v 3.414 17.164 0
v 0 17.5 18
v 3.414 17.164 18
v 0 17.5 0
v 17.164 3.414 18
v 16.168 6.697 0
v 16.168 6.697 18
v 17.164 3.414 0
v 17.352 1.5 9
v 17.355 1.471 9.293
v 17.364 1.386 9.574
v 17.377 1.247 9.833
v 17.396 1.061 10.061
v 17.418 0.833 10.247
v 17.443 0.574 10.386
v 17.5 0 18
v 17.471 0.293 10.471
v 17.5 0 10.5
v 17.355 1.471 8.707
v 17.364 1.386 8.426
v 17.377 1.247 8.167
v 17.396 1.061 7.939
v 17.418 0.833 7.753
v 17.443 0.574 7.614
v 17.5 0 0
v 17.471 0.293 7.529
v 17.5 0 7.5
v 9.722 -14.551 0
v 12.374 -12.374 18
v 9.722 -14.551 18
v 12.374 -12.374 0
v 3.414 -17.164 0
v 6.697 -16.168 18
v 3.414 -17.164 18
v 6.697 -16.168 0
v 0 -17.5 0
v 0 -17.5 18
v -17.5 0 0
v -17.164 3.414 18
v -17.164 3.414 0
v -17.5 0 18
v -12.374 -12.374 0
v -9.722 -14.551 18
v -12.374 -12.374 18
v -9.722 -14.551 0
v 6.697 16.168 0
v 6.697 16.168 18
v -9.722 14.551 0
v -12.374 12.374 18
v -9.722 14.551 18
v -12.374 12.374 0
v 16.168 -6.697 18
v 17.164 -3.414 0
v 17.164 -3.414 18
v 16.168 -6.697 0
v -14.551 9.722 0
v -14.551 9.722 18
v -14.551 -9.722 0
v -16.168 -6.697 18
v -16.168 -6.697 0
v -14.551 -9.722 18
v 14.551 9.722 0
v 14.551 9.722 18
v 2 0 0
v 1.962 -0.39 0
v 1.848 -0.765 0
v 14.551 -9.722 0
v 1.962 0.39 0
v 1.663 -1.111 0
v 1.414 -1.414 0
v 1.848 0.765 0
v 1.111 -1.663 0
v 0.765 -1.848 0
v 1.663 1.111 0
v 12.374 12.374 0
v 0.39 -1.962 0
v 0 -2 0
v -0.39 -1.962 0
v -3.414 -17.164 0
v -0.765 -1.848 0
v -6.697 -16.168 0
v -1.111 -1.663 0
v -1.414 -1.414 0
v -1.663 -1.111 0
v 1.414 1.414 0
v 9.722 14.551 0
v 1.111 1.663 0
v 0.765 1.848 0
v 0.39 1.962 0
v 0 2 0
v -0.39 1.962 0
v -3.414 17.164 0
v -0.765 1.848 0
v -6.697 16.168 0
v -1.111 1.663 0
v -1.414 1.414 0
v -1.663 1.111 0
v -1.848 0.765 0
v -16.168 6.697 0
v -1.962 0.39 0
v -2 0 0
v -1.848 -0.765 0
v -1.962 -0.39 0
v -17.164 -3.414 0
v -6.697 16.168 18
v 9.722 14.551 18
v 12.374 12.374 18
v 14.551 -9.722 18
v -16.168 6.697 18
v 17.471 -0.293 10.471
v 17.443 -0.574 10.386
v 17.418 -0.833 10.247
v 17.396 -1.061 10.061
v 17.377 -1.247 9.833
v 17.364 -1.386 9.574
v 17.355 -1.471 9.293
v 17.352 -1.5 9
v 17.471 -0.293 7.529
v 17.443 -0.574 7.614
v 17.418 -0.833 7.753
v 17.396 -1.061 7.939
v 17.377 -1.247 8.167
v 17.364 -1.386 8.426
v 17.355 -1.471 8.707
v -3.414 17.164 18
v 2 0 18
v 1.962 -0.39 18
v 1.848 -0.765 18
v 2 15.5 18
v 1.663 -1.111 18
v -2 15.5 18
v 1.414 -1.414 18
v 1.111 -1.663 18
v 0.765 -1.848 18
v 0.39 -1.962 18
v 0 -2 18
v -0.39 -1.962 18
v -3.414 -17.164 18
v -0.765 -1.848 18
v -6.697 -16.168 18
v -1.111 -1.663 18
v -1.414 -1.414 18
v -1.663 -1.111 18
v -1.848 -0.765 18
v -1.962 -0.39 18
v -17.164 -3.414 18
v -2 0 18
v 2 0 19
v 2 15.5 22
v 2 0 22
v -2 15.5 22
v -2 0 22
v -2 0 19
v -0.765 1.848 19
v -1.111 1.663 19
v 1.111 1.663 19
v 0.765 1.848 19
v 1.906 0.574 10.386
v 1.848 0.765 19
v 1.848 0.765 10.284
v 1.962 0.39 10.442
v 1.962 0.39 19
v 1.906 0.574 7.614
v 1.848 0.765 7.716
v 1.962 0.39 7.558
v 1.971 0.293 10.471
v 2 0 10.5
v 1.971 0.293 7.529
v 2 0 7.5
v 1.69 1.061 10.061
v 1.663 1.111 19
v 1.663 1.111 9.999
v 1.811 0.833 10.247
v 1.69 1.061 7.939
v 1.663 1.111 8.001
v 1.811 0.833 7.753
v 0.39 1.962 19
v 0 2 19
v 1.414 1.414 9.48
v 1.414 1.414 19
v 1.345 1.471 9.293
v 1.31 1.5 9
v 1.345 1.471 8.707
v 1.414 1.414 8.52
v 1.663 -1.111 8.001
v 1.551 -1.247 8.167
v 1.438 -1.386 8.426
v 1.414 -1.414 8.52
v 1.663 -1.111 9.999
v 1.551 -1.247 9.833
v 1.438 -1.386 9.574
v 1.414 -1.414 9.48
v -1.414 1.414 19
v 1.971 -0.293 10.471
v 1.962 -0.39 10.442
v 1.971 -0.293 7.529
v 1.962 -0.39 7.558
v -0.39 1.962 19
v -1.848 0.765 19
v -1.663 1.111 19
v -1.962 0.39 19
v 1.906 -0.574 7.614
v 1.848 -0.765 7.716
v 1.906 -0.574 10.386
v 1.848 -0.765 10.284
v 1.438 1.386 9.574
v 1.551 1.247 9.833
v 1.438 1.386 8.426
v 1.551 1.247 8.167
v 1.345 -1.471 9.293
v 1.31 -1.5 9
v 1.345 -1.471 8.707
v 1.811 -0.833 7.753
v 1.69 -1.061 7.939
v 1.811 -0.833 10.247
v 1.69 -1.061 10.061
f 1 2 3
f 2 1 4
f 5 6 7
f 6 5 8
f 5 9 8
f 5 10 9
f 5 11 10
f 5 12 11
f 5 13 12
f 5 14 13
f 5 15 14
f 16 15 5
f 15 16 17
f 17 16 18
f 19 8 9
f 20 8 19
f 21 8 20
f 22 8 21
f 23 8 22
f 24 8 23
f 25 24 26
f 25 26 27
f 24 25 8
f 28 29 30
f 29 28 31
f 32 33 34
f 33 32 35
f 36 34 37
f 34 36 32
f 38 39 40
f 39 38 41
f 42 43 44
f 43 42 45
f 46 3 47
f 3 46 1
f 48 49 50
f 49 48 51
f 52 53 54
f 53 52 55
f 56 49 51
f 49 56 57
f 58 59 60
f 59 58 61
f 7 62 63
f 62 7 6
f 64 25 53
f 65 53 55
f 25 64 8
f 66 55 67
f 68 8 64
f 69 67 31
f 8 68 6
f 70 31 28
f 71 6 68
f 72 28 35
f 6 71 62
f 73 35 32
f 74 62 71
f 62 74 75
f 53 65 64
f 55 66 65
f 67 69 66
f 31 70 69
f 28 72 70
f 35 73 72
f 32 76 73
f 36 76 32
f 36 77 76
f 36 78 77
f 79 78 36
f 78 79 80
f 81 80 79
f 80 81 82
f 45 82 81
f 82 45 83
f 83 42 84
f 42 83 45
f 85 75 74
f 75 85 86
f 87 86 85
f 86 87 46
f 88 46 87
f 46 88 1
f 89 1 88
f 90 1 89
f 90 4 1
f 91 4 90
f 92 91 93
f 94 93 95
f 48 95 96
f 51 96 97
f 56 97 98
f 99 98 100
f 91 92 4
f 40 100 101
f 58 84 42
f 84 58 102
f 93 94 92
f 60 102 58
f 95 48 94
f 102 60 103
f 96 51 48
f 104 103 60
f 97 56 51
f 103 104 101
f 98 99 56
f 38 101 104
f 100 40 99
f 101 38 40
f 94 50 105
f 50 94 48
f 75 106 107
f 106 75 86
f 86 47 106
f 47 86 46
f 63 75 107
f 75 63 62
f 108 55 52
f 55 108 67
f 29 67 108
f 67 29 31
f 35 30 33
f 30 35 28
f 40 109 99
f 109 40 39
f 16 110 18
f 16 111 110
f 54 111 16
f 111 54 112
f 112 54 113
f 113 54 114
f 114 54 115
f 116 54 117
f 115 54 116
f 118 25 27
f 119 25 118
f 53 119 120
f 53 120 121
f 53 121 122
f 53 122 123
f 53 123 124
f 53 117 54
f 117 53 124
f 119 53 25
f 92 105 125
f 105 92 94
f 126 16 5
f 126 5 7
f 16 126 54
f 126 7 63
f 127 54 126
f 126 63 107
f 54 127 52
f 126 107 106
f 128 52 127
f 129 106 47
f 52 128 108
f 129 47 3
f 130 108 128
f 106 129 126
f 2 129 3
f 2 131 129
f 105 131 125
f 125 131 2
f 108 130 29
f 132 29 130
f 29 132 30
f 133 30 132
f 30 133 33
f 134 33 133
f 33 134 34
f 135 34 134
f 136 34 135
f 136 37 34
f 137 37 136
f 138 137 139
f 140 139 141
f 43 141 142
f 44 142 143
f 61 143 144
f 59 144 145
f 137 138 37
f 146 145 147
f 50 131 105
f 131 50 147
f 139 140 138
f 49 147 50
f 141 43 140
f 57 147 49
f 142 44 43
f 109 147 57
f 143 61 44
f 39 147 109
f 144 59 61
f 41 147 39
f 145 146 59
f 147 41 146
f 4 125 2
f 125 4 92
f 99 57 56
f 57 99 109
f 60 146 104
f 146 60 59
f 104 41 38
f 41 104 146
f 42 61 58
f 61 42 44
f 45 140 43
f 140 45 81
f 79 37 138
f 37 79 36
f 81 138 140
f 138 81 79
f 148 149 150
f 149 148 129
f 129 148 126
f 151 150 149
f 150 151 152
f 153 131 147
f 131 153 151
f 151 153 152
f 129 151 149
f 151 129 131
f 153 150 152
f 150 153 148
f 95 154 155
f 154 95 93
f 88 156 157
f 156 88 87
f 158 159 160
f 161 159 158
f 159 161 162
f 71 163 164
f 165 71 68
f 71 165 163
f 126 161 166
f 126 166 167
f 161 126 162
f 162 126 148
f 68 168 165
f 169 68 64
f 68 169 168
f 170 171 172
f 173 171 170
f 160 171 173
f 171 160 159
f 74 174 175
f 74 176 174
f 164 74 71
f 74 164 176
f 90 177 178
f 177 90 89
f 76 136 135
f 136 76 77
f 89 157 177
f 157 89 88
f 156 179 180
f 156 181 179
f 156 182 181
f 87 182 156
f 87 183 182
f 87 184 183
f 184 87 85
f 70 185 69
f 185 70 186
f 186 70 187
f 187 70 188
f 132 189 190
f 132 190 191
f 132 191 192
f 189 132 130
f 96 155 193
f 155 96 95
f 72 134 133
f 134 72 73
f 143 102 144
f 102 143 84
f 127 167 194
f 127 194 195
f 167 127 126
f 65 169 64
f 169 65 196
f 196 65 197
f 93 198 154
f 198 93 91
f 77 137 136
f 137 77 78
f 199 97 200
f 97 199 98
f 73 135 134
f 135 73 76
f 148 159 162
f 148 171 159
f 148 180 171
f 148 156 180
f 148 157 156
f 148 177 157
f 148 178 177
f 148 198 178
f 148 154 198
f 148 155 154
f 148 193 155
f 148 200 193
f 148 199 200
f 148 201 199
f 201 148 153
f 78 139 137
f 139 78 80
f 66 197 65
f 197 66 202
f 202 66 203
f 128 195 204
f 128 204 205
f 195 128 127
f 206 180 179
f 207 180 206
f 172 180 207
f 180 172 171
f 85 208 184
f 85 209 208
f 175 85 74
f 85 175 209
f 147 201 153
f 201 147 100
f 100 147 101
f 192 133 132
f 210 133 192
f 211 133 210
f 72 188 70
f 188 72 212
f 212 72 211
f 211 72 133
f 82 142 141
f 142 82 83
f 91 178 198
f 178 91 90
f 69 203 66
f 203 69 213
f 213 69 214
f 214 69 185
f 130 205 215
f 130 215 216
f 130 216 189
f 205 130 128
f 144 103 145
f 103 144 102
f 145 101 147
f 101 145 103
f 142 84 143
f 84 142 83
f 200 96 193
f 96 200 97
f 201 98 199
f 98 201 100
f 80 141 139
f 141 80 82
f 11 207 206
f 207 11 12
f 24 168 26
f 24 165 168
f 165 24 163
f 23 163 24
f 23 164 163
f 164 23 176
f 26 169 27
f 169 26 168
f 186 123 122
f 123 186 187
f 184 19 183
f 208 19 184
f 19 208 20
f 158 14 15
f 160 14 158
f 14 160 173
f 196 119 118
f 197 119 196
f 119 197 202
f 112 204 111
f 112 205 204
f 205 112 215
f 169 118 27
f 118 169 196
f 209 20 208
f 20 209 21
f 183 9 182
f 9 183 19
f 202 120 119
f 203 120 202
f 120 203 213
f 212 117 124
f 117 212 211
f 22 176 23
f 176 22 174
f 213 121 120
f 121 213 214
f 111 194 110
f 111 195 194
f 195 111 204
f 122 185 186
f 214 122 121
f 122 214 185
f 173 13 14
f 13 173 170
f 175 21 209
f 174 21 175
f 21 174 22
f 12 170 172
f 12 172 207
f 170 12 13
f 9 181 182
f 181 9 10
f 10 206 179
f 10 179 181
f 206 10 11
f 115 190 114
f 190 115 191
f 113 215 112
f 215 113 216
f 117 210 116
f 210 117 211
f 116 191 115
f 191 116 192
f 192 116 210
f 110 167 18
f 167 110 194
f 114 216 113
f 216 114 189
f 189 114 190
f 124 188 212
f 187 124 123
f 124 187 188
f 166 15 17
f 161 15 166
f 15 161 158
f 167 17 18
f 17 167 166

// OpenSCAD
$fn = 32;

// ----------------------------------------------------------------------
// Control knob: pointer knob
// ----------------------------------------------------------------------

// --- parameters (mm) ---
rib_w = 4;                // pointer rib width
rib_h = 5;                // pointer rib height
knob_d = 35;              // knob body diameter
knob_h = 18;              // knob body height
bore_d = 4;               // shaft bore diameter
set_d = 3;                // set screw bore diameter
fit_tol = 0.02;           // tolerance for press fits, mm
free_tol = 0.2;           // tolerance for clearance fits, mm

rib_poke = rib_h - 1;  // rib height above the top
total_h = knob_h + rib_h - 1;  // overall height

difference() {
  union() {
    cylinder(h = knob_h, d = knob_d);
    translate([-rib_w / 2, 0, knob_h - 1])
      cube([rib_w, knob_d / 2 - 2, rib_h]);
  }
  translate([0, 0, -1]) cylinder(h = knob_h + 2, d = bore_d);
  translate([-1, 0, knob_h / 2]) rotate([0, 90, 0])
    cylinder(h = knob_d / 2 + bore_d / 2 + 2, d = set_d);}
